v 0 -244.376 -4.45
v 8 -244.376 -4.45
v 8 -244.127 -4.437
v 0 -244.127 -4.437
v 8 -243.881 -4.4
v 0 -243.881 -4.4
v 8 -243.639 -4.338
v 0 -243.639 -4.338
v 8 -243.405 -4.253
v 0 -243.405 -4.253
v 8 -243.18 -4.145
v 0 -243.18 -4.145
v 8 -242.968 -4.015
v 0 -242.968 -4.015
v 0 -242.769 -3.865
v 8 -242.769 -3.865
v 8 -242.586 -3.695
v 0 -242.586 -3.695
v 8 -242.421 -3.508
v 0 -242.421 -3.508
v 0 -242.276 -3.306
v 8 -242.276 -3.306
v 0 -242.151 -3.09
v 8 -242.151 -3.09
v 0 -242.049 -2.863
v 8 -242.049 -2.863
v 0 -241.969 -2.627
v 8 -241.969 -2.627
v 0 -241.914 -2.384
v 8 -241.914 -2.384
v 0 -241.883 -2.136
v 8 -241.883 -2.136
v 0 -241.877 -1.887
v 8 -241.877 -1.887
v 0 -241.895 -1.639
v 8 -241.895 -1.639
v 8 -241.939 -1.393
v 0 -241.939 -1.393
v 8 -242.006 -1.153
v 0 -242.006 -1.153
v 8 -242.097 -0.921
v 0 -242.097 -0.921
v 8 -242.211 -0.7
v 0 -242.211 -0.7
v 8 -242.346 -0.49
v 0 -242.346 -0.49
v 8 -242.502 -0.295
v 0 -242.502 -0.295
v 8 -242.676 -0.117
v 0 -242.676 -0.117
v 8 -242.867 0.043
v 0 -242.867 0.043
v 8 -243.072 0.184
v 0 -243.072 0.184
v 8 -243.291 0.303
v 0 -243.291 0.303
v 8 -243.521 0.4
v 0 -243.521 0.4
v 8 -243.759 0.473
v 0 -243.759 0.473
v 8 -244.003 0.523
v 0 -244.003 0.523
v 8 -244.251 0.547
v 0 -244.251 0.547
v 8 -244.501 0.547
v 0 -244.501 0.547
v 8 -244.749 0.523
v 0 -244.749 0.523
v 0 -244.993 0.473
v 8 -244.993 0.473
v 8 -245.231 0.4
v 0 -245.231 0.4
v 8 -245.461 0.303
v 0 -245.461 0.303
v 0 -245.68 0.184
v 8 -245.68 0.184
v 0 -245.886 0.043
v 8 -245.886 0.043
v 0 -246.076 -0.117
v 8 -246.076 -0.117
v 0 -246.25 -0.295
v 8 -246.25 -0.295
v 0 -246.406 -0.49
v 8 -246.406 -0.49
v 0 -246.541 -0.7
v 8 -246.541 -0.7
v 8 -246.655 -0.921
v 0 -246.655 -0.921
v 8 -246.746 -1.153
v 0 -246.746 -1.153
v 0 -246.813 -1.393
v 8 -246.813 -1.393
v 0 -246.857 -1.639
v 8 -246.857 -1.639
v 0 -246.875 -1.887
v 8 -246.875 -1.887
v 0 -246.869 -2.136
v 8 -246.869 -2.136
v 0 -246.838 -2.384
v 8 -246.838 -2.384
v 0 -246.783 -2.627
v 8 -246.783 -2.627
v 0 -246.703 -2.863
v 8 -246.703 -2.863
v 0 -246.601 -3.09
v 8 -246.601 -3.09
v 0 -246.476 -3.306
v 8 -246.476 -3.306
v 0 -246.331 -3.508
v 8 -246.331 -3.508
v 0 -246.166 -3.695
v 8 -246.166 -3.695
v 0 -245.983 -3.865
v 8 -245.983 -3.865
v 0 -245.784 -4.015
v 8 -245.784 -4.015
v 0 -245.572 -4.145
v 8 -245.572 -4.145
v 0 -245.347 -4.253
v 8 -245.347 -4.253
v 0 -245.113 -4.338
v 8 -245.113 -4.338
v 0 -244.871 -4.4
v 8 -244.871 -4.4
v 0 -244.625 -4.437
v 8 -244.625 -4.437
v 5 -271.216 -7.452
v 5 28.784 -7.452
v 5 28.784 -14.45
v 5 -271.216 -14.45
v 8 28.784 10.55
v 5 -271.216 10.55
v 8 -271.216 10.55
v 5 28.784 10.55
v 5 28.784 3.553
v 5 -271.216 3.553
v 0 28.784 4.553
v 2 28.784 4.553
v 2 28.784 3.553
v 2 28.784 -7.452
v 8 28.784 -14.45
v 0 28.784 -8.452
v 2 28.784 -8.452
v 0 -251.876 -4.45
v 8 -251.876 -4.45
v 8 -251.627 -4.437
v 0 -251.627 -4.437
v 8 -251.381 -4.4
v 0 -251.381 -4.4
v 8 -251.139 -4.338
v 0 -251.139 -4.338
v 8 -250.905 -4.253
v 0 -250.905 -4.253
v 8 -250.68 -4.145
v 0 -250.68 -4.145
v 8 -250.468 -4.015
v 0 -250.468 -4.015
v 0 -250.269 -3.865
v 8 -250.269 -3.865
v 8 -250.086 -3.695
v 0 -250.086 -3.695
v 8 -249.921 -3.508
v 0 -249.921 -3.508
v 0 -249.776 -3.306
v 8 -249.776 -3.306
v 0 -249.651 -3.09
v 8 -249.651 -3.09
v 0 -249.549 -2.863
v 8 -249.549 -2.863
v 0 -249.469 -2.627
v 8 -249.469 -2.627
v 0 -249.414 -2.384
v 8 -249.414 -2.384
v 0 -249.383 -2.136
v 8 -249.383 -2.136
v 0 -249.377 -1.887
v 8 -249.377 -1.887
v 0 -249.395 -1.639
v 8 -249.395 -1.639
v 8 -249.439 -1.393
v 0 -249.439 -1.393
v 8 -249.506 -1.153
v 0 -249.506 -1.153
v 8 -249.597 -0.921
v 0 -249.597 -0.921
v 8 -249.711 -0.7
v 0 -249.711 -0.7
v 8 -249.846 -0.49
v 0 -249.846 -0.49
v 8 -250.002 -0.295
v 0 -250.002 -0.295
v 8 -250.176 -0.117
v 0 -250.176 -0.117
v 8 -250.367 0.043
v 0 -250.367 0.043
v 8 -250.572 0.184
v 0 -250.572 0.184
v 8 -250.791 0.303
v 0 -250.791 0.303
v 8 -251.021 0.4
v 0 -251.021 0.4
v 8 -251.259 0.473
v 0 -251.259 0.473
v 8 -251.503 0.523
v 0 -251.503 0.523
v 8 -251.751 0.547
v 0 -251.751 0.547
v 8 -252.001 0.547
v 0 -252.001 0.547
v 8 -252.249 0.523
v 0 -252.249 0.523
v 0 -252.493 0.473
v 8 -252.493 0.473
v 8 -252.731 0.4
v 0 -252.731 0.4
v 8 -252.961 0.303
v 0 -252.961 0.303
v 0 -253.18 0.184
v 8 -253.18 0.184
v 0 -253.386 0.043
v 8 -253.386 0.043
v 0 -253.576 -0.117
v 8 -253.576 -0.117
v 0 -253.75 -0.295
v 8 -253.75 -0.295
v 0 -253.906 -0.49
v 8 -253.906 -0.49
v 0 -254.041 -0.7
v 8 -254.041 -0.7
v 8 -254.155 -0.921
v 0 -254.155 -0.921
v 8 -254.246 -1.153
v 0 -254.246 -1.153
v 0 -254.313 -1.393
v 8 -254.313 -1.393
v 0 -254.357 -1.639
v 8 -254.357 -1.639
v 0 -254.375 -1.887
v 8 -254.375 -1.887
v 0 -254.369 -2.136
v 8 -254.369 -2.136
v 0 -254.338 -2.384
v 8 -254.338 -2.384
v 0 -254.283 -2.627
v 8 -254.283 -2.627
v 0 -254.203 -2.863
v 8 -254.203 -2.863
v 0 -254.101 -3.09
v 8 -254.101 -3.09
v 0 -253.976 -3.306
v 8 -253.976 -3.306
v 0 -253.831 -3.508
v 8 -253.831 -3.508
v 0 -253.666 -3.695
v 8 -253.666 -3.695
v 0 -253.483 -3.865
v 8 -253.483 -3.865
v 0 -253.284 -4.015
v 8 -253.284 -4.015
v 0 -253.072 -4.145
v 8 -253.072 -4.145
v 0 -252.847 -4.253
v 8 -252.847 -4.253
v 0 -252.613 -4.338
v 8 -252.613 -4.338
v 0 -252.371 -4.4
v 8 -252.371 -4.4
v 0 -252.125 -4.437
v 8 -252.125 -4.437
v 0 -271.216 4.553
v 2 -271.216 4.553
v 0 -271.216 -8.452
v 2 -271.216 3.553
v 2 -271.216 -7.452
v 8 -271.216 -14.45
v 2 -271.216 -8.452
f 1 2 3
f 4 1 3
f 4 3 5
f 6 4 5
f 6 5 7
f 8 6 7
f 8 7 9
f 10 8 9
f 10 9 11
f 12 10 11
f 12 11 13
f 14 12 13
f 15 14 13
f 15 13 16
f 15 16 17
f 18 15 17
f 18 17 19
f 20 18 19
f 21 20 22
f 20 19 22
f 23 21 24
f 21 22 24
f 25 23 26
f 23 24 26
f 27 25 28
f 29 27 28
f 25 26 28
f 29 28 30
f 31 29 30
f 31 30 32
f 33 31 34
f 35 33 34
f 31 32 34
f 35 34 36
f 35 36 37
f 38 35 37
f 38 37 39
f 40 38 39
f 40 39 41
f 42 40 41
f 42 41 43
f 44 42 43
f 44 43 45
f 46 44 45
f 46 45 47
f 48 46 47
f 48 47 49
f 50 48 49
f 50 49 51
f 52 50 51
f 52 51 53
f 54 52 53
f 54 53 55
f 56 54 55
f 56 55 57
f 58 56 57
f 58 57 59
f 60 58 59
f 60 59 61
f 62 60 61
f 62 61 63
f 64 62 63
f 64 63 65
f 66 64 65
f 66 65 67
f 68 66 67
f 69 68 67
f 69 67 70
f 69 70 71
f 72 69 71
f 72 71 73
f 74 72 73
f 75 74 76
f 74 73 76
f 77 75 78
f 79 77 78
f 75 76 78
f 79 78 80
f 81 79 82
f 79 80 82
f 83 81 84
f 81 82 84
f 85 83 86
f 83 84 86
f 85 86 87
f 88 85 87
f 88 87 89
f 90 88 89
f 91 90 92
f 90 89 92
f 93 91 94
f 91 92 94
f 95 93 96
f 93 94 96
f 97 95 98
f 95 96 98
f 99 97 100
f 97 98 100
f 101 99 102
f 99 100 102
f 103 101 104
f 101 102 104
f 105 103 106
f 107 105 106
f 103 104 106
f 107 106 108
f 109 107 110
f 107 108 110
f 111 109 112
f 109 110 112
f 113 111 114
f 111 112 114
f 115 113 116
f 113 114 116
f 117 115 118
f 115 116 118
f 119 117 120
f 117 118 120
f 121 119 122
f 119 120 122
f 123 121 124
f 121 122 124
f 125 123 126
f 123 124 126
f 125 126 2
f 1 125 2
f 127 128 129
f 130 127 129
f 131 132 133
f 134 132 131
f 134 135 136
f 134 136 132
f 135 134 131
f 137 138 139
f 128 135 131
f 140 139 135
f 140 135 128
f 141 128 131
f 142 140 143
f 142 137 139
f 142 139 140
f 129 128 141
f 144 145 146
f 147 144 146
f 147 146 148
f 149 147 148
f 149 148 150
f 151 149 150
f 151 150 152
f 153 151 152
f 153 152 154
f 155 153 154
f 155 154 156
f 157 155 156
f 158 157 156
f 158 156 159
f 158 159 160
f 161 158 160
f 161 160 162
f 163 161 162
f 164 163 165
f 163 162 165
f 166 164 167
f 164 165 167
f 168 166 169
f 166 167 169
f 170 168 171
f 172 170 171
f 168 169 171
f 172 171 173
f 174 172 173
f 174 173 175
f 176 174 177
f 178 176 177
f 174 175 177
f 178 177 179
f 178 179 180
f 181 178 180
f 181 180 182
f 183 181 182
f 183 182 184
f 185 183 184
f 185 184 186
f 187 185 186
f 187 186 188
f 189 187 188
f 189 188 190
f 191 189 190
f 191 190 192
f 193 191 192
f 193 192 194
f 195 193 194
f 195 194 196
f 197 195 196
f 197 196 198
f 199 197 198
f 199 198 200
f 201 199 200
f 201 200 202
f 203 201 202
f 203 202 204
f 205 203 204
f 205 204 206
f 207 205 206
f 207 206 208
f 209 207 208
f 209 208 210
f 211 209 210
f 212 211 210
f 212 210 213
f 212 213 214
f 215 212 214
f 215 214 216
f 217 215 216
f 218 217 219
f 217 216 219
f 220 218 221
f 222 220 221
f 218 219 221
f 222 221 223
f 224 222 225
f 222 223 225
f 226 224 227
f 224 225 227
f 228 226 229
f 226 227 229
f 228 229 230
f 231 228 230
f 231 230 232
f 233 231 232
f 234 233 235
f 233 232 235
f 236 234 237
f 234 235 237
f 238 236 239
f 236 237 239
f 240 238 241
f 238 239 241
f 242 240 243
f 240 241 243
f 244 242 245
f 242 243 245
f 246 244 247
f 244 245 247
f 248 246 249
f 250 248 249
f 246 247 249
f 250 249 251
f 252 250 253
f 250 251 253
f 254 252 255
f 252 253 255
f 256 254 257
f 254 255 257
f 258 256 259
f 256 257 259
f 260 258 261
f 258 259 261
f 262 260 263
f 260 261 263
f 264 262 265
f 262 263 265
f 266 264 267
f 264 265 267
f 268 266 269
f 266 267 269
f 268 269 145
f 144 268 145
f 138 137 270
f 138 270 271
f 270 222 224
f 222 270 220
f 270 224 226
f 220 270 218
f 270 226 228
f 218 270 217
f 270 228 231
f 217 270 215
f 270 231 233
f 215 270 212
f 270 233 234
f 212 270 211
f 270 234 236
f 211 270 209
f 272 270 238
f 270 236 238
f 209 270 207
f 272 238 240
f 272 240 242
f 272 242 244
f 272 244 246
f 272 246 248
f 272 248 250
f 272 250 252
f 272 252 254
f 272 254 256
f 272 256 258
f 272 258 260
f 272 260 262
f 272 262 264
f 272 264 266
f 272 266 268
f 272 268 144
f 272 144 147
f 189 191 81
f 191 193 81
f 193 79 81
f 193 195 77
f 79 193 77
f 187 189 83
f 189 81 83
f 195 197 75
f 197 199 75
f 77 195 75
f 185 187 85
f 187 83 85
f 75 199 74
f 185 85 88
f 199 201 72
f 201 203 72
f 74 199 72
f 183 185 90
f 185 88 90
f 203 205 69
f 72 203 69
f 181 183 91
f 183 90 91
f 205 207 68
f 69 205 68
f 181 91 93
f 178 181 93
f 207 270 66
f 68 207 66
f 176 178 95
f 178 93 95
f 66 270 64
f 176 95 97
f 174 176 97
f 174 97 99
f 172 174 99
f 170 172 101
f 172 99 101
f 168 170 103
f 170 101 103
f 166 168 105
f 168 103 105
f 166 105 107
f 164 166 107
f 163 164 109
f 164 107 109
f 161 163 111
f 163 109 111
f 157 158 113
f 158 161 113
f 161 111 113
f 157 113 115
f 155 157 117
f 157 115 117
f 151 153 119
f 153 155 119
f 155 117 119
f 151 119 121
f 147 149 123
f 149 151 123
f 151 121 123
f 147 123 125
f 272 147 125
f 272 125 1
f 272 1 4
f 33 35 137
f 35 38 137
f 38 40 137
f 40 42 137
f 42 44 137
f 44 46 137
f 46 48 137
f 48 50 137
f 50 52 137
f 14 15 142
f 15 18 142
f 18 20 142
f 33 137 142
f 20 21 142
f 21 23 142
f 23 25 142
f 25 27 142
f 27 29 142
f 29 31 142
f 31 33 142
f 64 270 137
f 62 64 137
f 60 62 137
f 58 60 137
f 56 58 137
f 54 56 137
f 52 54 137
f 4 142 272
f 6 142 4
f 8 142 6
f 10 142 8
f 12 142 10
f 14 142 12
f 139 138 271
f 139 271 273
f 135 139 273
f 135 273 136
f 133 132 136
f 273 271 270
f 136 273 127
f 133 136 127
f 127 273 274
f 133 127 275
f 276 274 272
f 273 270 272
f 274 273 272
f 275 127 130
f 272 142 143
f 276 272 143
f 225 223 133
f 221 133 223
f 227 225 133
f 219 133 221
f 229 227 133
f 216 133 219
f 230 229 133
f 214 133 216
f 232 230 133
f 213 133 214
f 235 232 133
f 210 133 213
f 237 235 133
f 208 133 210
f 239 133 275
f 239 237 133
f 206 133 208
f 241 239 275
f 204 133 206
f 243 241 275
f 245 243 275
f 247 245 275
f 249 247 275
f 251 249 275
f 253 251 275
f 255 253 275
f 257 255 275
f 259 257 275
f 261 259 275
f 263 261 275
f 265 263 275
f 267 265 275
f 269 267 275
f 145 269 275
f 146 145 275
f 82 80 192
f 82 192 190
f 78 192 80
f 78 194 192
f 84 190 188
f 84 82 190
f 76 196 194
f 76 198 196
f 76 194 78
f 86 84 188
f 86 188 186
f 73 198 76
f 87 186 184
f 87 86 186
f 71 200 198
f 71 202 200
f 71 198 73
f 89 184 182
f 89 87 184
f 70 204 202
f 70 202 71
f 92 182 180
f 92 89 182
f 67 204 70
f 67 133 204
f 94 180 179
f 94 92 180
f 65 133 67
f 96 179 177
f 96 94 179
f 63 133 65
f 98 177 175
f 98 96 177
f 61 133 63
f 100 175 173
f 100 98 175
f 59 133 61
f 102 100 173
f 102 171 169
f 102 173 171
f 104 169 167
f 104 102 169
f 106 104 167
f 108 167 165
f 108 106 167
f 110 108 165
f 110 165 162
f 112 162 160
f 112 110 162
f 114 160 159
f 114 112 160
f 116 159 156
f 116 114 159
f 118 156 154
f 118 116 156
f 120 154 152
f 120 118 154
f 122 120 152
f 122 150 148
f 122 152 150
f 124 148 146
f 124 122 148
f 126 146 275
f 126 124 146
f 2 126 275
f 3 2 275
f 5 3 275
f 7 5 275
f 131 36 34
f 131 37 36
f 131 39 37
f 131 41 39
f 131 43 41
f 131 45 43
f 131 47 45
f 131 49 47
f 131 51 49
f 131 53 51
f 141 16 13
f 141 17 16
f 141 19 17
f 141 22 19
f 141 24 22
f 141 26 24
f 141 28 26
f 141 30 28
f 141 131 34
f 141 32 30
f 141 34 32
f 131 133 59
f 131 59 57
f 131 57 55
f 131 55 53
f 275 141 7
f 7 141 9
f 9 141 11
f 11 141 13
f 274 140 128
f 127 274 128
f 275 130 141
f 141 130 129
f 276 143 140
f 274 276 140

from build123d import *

# Parameters (mm, degrees)
CROQUIS1_W              = 25
CROQUIS1_H              = 300
SALIENTE_EXTRUIR1_DEPTH = 8
CORTAR_EXTRUIR1_DEPTH   = 301.454304751
CROQUIS3_R              = 2.5
CORTAR_EXTRUIR2_DEPTH   = 272.718032041


with BuildPart() as part:
    # Croquis1 → Saliente-Extruir1 (new body)
    with BuildSketch(Plane(origin=(0, 0, 0), x_dir=(0, 0, -1), z_dir=(1, 0, 0))):
        with Locations((1.949541284, -121.21559633)):
            Rectangle(CROQUIS1_W, CROQUIS1_H)
    extrude(amount=SALIENTE_EXTRUIR1_DEPTH)

    # Croquis2 → Cortar-Extruir1 (cut, through all)
    with BuildSketch(Plane(origin=(0, 28.78440367, 0), x_dir=(1, 0, 0), z_dir=(0, 1, 0))):
        Polygon((2, 8.451958984), (2, 7.451958984), (5, 7.451958984), (5, 14.449541284), (0, 14.449541284), (0, 8.451958984), align=None)
        Polygon((5, -10.550458716), (0, -10.550458716), (0, -4.552876416), (2, -4.552876416), (2, -3.552876416), (5, -3.552876416), align=None)
    extrude(amount=-CORTAR_EXTRUIR1_DEPTH, mode=Mode.SUBTRACT)

    # Croquis3 → Cortar-Extruir2 (cut, through all)
    with BuildSketch(Plane(origin=(8, 0, 0), x_dir=(0, 0, -1), z_dir=(1, 0, 0))):
        with Locations((1.949541284, -251.876037927)):
            Circle(CROQUIS3_R)
        with Locations((1.949541284, -244.376037927)):
            Circle(CROQUIS3_R)
    extrude(amount=-CORTAR_EXTRUIR2_DEPTH, mode=Mode.SUBTRACT)


solid = part.part
